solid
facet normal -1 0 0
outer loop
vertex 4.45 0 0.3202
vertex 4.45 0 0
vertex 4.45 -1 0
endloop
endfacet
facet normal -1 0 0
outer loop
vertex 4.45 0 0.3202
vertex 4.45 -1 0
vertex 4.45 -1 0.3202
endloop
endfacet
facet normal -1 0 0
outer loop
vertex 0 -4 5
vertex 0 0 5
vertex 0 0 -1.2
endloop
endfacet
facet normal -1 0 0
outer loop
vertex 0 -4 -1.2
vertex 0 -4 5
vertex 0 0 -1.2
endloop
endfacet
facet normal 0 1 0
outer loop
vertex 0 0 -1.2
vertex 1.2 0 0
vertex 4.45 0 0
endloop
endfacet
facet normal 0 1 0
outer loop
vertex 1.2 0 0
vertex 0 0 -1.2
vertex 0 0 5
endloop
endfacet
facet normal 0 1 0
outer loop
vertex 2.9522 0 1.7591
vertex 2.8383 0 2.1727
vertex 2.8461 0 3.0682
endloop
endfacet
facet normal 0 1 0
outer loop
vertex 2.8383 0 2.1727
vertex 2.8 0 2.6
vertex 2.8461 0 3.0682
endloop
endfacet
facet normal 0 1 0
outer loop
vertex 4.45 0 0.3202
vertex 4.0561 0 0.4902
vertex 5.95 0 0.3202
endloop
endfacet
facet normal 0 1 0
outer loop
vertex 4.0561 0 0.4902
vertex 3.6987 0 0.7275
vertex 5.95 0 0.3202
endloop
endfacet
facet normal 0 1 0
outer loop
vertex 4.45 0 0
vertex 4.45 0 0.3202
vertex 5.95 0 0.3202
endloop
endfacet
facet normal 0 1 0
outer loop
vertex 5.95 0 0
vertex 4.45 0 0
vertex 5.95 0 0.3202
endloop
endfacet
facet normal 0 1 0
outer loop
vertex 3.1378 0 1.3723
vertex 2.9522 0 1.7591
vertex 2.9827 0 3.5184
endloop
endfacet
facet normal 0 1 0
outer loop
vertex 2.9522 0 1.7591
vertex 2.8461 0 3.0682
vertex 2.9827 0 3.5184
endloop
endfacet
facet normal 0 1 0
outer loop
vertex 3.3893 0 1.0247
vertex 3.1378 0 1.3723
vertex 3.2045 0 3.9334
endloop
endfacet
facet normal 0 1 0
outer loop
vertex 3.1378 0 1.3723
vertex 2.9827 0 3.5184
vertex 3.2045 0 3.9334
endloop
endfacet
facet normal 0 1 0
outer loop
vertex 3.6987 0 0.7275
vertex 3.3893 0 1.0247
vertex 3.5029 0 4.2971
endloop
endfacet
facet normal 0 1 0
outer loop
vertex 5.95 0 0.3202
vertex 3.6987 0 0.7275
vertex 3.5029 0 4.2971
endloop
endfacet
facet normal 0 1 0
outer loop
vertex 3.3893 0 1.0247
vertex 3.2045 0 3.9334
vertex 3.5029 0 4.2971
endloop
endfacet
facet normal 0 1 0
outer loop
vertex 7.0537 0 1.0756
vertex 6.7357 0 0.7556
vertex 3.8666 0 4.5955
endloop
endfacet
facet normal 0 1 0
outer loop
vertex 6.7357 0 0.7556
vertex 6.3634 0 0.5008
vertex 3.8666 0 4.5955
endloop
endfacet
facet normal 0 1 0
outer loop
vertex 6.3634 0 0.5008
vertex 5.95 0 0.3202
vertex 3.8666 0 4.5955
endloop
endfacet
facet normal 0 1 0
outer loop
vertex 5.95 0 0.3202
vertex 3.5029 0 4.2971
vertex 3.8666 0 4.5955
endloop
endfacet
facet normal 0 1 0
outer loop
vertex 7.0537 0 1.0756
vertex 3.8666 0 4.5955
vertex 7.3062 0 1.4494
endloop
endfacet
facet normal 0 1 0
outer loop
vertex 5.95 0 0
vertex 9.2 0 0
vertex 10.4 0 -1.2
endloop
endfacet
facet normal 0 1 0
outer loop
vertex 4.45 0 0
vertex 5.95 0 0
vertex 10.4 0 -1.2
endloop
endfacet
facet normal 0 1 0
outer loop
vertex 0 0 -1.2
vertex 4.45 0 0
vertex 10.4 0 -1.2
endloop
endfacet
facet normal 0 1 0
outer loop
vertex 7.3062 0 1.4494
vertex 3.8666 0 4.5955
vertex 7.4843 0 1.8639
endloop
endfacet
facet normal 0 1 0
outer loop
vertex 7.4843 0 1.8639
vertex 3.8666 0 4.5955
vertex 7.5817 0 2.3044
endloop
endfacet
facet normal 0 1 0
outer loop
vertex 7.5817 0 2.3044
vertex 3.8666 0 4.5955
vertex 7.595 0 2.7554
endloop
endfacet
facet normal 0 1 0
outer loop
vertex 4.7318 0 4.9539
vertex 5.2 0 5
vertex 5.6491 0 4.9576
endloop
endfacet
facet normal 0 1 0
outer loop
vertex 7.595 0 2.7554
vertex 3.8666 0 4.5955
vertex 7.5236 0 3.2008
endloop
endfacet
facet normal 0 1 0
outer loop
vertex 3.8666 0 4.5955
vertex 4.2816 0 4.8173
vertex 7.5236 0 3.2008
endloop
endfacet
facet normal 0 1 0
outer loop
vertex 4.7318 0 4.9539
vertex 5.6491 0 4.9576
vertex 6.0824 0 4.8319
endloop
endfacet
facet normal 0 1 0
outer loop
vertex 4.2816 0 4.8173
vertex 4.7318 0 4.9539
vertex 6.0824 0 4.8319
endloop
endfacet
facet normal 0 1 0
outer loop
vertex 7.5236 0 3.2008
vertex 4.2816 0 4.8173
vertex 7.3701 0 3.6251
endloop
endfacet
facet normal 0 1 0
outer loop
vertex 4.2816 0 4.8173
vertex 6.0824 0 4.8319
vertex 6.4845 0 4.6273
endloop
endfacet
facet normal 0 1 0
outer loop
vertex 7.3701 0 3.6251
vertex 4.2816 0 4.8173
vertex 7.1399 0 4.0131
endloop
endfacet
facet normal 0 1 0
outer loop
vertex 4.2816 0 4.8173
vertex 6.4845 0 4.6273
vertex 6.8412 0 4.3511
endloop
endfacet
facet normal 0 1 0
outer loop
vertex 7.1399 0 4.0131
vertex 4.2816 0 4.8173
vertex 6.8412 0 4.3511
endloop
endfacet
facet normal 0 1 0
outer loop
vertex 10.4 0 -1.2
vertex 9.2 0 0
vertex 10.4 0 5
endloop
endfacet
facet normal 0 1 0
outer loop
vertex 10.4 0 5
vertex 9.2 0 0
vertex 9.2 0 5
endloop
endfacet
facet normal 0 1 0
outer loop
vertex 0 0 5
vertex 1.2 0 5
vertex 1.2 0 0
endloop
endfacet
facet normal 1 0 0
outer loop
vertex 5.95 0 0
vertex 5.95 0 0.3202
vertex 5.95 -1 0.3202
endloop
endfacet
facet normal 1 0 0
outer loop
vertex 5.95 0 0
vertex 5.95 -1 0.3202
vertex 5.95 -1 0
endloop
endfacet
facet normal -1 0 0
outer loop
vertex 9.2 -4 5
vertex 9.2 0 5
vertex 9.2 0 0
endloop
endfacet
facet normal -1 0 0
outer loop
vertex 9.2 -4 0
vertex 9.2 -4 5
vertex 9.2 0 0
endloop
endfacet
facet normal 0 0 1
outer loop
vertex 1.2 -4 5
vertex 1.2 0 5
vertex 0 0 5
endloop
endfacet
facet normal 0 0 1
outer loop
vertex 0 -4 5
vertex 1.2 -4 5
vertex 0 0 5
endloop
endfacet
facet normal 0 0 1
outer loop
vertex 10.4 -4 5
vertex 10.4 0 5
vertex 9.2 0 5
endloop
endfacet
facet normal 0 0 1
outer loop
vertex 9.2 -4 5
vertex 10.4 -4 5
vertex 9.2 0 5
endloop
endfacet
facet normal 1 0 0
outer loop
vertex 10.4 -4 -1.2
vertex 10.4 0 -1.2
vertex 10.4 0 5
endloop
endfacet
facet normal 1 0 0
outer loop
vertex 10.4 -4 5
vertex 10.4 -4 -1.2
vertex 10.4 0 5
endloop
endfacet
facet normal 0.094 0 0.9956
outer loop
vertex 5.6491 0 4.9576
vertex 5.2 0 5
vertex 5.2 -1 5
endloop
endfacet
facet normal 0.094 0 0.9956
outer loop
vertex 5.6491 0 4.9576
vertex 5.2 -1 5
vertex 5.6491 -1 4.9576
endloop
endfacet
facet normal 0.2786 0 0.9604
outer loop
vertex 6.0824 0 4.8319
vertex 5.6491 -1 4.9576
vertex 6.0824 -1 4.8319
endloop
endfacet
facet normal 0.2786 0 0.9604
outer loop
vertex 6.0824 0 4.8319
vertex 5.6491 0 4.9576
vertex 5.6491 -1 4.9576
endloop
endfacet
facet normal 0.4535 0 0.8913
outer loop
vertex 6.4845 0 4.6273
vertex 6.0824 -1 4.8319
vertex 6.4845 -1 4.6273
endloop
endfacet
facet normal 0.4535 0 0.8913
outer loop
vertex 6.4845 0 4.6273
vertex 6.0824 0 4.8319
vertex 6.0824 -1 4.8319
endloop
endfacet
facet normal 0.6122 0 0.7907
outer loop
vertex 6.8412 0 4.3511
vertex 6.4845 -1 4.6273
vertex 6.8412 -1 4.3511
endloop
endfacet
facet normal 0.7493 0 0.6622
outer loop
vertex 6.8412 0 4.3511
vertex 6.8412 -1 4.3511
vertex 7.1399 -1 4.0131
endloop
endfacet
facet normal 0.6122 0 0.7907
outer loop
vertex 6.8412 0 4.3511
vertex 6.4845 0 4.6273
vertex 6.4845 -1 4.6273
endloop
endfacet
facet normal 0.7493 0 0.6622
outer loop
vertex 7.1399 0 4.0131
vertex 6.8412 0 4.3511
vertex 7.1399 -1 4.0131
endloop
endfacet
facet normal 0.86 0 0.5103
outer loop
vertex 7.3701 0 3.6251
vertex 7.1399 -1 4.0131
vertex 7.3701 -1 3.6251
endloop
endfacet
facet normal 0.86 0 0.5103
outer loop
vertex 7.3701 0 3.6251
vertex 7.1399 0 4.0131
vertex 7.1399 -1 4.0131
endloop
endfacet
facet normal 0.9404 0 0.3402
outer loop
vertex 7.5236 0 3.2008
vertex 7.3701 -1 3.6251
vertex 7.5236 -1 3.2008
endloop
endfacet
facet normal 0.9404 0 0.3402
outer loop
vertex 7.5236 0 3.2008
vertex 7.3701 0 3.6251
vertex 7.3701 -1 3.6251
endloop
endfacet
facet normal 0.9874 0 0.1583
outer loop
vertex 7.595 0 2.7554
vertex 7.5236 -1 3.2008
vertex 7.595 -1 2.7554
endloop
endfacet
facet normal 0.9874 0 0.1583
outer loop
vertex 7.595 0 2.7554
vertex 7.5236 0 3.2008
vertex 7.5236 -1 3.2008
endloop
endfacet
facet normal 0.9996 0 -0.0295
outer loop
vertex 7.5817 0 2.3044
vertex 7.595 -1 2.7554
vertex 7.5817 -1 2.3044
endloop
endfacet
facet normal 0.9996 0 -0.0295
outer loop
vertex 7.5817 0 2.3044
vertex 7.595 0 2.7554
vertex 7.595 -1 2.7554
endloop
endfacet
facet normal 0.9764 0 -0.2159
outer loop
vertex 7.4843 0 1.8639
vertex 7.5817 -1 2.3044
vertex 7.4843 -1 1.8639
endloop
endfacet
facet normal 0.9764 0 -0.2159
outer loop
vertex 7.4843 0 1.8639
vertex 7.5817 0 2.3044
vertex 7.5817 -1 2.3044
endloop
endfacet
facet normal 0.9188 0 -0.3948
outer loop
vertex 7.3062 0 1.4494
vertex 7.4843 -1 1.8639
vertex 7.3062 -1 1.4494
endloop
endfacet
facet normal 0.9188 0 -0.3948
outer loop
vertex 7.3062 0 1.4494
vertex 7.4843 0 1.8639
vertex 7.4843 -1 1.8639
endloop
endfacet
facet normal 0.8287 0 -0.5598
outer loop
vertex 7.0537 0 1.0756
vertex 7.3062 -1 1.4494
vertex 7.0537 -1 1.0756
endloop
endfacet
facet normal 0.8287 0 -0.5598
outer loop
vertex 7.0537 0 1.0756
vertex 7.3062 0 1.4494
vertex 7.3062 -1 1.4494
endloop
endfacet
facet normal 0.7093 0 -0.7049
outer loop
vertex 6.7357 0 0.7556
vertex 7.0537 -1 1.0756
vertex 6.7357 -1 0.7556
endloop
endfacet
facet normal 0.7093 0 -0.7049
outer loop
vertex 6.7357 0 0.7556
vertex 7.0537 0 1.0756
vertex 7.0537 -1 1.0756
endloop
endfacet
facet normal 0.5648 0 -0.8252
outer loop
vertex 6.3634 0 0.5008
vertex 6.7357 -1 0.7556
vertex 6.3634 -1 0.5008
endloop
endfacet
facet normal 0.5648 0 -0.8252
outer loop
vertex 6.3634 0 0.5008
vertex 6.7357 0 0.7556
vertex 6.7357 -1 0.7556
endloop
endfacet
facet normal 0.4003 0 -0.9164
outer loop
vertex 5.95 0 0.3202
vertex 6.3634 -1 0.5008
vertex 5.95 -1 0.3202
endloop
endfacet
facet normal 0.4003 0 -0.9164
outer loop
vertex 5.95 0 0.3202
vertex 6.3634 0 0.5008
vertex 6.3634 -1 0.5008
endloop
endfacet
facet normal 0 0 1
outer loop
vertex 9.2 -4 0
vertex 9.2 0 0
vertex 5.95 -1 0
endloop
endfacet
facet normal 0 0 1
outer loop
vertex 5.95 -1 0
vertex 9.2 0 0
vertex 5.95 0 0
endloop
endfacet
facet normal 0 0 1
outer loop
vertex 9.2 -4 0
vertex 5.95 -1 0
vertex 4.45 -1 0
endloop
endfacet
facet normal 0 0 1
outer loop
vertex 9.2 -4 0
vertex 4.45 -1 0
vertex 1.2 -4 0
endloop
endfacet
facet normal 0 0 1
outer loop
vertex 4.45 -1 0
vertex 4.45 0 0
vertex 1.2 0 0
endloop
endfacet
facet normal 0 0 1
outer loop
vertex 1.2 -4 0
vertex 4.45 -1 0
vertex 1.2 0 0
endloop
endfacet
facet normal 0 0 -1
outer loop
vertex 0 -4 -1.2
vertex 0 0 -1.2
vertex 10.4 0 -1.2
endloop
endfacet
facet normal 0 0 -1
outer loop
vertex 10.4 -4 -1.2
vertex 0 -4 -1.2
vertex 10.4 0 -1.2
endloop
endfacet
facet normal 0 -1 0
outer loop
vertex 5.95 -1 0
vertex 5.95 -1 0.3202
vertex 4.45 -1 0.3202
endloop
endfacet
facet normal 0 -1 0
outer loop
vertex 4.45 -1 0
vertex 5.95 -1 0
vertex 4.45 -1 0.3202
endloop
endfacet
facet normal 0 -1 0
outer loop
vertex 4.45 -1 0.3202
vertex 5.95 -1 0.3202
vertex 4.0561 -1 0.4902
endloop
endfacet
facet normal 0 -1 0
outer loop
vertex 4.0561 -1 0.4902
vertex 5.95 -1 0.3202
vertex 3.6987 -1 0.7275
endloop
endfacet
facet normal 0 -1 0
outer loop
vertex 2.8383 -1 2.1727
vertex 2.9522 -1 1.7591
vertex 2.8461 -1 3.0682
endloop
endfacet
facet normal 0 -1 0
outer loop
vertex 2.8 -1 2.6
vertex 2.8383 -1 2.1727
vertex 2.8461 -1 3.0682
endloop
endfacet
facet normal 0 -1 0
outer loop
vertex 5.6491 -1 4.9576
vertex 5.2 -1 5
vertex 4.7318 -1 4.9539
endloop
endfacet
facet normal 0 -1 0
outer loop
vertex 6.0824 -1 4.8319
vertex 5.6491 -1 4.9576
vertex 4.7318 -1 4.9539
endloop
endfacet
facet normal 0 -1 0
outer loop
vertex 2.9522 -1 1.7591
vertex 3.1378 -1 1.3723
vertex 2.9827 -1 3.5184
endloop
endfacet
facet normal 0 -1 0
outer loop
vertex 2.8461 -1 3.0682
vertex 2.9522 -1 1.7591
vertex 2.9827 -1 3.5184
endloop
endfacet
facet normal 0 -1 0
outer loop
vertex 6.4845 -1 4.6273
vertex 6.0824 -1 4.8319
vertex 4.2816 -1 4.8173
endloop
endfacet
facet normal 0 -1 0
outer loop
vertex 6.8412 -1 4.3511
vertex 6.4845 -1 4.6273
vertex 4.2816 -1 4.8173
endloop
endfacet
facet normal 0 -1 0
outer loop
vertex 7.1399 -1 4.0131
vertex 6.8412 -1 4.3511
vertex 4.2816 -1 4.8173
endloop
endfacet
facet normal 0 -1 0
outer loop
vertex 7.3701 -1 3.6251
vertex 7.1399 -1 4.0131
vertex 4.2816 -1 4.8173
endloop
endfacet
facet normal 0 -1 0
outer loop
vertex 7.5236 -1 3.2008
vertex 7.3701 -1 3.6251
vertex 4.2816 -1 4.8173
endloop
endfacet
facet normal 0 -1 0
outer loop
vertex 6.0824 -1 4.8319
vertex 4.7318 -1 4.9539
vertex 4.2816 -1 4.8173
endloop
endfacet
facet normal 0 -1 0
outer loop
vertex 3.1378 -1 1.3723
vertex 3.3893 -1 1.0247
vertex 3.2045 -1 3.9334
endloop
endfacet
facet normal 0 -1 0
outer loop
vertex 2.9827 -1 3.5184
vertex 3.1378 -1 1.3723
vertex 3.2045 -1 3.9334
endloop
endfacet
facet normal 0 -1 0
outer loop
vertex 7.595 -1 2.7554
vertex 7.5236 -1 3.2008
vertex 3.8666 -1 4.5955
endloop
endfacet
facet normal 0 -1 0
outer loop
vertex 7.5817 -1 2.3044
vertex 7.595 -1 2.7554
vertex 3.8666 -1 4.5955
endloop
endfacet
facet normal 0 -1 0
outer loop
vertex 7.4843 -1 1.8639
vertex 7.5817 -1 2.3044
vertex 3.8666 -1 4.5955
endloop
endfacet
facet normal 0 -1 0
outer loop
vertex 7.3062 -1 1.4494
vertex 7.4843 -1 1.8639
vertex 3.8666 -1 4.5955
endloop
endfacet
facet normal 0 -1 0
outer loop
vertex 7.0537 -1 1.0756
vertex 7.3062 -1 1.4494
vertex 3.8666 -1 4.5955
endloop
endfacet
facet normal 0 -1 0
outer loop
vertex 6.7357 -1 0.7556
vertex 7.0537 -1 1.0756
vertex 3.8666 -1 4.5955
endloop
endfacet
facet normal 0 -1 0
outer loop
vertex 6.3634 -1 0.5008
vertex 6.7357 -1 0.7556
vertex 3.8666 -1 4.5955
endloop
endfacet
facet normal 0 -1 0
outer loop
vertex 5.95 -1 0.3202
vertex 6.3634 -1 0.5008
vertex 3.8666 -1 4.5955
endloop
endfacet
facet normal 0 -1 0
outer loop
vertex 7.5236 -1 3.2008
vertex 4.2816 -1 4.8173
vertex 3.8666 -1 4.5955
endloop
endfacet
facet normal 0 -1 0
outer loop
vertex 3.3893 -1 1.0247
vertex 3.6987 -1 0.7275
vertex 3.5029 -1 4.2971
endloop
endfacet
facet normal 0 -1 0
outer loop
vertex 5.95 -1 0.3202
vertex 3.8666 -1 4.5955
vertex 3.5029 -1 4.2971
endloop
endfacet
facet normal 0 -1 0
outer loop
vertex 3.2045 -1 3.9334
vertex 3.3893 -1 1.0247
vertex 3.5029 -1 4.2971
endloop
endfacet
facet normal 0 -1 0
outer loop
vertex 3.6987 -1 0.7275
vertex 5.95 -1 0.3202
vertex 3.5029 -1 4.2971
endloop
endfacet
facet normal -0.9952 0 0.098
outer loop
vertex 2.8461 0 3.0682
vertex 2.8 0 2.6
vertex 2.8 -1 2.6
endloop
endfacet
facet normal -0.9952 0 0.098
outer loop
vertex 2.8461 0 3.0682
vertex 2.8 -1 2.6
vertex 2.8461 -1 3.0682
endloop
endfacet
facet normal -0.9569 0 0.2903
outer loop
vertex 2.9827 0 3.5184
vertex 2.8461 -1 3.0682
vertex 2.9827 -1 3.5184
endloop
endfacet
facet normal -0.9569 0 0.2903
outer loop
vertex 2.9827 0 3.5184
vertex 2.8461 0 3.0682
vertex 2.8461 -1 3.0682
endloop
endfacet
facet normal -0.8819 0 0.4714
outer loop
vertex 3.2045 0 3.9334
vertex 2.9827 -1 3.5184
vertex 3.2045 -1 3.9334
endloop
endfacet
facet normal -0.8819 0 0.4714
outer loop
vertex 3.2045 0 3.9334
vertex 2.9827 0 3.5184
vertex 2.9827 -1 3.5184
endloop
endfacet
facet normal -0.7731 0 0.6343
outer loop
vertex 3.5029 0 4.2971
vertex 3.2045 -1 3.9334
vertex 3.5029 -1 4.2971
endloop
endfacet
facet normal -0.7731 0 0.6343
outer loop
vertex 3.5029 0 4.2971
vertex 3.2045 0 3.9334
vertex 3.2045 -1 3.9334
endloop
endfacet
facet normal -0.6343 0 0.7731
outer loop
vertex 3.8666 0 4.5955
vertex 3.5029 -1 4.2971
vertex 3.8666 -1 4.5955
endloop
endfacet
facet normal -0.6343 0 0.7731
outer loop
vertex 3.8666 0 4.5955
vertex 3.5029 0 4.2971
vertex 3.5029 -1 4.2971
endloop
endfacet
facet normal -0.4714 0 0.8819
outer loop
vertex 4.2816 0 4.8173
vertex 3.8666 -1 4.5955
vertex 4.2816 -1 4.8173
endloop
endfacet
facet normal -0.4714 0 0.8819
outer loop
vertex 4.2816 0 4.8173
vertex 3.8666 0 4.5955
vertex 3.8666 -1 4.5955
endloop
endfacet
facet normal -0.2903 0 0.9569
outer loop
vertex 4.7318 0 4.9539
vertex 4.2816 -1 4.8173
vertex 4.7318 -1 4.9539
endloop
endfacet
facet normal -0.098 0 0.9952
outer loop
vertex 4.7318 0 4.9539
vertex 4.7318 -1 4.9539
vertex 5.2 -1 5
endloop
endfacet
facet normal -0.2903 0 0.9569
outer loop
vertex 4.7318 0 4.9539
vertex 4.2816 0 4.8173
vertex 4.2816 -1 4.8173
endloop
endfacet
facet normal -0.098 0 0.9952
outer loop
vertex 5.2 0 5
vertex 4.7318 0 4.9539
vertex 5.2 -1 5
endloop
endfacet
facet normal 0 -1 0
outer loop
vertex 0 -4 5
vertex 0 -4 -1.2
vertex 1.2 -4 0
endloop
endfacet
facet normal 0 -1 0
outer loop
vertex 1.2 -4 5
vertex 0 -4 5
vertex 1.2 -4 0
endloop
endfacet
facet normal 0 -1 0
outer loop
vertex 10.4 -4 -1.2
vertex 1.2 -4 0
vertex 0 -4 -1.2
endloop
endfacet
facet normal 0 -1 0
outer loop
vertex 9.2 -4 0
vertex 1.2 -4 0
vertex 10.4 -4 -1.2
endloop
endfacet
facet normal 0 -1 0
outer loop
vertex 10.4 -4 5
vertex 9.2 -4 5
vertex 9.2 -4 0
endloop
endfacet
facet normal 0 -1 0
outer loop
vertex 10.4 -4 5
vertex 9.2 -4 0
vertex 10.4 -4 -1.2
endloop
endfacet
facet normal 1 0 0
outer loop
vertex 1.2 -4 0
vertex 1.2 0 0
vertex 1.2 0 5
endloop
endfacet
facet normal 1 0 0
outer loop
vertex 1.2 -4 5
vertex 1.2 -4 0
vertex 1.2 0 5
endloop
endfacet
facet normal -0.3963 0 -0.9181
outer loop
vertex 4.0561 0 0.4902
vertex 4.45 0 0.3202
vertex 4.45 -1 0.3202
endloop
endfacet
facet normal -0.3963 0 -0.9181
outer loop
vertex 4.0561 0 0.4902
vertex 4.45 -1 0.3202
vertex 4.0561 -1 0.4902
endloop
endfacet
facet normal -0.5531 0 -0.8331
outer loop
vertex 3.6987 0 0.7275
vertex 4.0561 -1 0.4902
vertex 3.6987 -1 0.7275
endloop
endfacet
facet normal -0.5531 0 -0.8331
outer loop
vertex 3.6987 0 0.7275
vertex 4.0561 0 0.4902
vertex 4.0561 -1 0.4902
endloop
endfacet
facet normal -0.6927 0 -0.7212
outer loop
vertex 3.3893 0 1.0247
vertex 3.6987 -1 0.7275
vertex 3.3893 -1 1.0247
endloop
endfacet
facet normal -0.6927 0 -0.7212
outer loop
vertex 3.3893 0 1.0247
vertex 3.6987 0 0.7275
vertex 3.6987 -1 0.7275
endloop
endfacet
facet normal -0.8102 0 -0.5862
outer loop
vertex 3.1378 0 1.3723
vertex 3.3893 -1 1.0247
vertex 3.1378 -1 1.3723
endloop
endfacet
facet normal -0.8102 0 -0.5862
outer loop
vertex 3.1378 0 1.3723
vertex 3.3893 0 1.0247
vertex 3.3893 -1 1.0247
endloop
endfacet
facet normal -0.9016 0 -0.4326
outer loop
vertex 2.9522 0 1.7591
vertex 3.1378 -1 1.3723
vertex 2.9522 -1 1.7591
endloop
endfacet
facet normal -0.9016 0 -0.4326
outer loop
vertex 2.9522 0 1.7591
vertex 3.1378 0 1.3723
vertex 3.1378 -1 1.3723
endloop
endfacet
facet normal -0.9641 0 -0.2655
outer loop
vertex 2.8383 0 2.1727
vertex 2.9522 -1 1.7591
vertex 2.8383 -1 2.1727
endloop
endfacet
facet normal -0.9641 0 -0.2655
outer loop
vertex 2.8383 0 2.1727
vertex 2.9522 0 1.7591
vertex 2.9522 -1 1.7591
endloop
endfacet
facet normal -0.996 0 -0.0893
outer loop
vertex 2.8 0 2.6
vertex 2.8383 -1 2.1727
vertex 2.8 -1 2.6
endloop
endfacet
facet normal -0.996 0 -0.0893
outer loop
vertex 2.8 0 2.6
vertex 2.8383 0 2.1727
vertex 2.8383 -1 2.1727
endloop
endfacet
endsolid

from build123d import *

# Parameters (mm, degrees)
F1_DEPTH = 5
F3_DEPTH = 1.9
F3_TAPER = 10
F5_DEPTH = 1
F6_W     = 8
F6_H     = 3.4583588084
F7_DEPTH = 25
F8_W     = 14.479
F8_H     = 1
F9_DEPTH = 25


with BuildPart() as f1:
    # F0 (on Front) → F1 (new body)
    with BuildSketch(Plane.XZ):
        Polygon((0, 5), (0, 0), (0, -1.2), (10.4, -1.2), (10.4, 0), (10.4, 5), (9.2, 5), (9.2, 0), (1.2, 0), (1.2, 5), align=None)
    extrude(amount=F1_DEPTH)

    # F2 (on face) → F3 (join)
    with BuildSketch(Plane.XY):
        with BuildLine():
            ThreePointArc((5.9758246596, -2.5), (5.7485908778, -1.9514091222), (5.2, -1.7241753404))
            Line((5.2, -1.7241753404), (5.2, -3.2758246596))
            ThreePointArc((5.2, -3.2758246596), (5.7485908778, -3.0485908778), (5.9758246596, -2.5))
        make_face()
        with BuildLine():
            Line((5.2, -3.2758246596), (5.2, -1.7241753404))
            ThreePointArc((5.2, -1.7241753404), (4.4241753404, -2.5), (5.2, -3.2758246596))
        make_face()
    extrude(amount=F3_DEPTH, taper=F3_TAPER)

    # F4 (on face) → F5 (join)
    with BuildSketch(Plane(origin=(0, 0, 0), x_dir=(-1, 0, 0), z_dir=(0, 1, 0))):
        with BuildLine():
            ThreePointArc((-4.45, 0.320197377), (-3.2557777905, 1.1928752721), (-2.8, 2.6))
            ThreePointArc((-2.8, 2.6), (-3.5029437252, 4.2970562748), (-5.2, 5))
            ThreePointArc((-5.2, 5), (-7.5697601456, 2.9797852714), (-5.95, 0.320197377))
            ThreePointArc((-5.95, 0.320197377), (-5.2, 0.2), (-4.45, 0.320197377))
        make_face()
        with BuildLine():
            Line((-4.45, 0), (-4.45, 0.320197377))
            ThreePointArc((-4.45, 0.320197377), (-5.2, 0.2), (-5.95, 0.320197377))
            Line((-5.95, 0.320197377), (-5.95, 0))
            Line((-5.95, 0), (-4.45, 0))
        make_face()
    extrude(amount=-F5_DEPTH)

    # F6 (on face) → F7 (cut)
    with BuildSketch(Plane.XY):
        with Locations((5.2, -3.2708205958)):
            Rectangle(F6_W, F6_H)
    extrude(amount=F7_DEPTH, mode=Mode.SUBTRACT)

    # F8 (on face) → F9 (cut)
    with BuildSketch(Plane.XY.offset(5)):
        with Locations((3.1605, -4.5)):
            Rectangle(F8_W, F8_H)
    extrude(amount=-F9_DEPTH, mode=Mode.SUBTRACT)


solid = f1.part
